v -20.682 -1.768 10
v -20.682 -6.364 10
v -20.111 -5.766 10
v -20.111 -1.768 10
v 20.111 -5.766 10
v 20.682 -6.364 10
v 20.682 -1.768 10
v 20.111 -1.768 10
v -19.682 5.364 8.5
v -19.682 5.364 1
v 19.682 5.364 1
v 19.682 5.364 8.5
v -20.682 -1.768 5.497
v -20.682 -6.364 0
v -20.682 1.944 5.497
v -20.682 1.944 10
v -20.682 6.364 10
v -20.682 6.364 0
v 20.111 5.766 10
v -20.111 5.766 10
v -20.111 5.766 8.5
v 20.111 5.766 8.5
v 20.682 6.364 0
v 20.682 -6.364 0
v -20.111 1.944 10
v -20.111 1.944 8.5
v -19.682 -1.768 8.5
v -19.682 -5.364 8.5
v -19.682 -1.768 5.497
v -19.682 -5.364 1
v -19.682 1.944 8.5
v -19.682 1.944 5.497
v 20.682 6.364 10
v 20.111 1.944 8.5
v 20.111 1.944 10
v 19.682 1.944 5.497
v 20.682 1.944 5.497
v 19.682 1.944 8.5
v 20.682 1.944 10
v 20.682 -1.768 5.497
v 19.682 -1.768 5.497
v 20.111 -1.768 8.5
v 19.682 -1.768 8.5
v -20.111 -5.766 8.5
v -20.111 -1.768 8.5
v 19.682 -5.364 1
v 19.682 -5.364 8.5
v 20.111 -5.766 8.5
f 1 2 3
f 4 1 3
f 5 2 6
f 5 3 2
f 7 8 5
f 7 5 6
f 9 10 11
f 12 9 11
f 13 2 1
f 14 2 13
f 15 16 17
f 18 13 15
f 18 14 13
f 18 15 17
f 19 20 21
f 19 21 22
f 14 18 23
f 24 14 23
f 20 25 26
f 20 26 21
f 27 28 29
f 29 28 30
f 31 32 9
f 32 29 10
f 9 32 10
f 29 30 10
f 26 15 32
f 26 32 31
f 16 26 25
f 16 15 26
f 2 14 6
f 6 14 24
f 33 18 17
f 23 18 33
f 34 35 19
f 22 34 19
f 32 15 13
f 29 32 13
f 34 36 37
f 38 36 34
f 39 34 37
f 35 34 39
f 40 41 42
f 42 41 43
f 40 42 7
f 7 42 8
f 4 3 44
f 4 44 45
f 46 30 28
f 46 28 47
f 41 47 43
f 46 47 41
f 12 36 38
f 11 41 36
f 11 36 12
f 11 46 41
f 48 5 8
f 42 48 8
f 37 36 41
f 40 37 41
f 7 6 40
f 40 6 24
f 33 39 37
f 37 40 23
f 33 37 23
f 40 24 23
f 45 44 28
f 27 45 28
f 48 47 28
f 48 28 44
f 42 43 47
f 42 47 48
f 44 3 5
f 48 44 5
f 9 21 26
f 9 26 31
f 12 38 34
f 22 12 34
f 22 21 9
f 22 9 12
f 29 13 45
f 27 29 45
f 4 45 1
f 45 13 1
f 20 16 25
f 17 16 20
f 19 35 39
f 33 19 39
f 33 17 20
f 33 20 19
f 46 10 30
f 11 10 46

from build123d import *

# Parameters (mm, degrees)
F0_W     = 41.3636378944
F0_H     = 12.7272736281
F1_DEPTH = 10
F2_T     = -1
F3_W     = 40.2219519019
F3_H     = 11.5317674354
F4_DEPTH = 1.5
F5_W     = 3.7121215137
F5_H     = 4.5032251999
F6_DEPTH = 60


with BuildPart() as f1:
    # F0 (on Top) → F1 (new body)
    with BuildSketch(Plane.XY):
        Rectangle(F0_W, F0_H)
    extrude(amount=F1_DEPTH)

    # F2
    f2_openings = [f1.faces().sort_by_distance(p)[0] for p in [
        (0, 0, 10),
    ]]
    offset(amount=F2_T, openings=f2_openings)

    # F3 (on face) → F4 (cut)
    with BuildSketch(Plane.XY.offset(10)):
        Rectangle(F3_W, F3_H)
    extrude(amount=-F4_DEPTH, mode=Mode.SUBTRACT)

    # F5 (on face) → F6 (cut)
    with BuildSketch(Plane(origin=(-20.6818189472, 0, 0), x_dir=(0, -1, 0), z_dir=(-1, 0, 0))):
        with Locations((-0.0884092296, 7.7483874001)):
            Rectangle(F5_W, F5_H)
    extrude(amount=-F6_DEPTH, mode=Mode.SUBTRACT)


solid = f1.part
